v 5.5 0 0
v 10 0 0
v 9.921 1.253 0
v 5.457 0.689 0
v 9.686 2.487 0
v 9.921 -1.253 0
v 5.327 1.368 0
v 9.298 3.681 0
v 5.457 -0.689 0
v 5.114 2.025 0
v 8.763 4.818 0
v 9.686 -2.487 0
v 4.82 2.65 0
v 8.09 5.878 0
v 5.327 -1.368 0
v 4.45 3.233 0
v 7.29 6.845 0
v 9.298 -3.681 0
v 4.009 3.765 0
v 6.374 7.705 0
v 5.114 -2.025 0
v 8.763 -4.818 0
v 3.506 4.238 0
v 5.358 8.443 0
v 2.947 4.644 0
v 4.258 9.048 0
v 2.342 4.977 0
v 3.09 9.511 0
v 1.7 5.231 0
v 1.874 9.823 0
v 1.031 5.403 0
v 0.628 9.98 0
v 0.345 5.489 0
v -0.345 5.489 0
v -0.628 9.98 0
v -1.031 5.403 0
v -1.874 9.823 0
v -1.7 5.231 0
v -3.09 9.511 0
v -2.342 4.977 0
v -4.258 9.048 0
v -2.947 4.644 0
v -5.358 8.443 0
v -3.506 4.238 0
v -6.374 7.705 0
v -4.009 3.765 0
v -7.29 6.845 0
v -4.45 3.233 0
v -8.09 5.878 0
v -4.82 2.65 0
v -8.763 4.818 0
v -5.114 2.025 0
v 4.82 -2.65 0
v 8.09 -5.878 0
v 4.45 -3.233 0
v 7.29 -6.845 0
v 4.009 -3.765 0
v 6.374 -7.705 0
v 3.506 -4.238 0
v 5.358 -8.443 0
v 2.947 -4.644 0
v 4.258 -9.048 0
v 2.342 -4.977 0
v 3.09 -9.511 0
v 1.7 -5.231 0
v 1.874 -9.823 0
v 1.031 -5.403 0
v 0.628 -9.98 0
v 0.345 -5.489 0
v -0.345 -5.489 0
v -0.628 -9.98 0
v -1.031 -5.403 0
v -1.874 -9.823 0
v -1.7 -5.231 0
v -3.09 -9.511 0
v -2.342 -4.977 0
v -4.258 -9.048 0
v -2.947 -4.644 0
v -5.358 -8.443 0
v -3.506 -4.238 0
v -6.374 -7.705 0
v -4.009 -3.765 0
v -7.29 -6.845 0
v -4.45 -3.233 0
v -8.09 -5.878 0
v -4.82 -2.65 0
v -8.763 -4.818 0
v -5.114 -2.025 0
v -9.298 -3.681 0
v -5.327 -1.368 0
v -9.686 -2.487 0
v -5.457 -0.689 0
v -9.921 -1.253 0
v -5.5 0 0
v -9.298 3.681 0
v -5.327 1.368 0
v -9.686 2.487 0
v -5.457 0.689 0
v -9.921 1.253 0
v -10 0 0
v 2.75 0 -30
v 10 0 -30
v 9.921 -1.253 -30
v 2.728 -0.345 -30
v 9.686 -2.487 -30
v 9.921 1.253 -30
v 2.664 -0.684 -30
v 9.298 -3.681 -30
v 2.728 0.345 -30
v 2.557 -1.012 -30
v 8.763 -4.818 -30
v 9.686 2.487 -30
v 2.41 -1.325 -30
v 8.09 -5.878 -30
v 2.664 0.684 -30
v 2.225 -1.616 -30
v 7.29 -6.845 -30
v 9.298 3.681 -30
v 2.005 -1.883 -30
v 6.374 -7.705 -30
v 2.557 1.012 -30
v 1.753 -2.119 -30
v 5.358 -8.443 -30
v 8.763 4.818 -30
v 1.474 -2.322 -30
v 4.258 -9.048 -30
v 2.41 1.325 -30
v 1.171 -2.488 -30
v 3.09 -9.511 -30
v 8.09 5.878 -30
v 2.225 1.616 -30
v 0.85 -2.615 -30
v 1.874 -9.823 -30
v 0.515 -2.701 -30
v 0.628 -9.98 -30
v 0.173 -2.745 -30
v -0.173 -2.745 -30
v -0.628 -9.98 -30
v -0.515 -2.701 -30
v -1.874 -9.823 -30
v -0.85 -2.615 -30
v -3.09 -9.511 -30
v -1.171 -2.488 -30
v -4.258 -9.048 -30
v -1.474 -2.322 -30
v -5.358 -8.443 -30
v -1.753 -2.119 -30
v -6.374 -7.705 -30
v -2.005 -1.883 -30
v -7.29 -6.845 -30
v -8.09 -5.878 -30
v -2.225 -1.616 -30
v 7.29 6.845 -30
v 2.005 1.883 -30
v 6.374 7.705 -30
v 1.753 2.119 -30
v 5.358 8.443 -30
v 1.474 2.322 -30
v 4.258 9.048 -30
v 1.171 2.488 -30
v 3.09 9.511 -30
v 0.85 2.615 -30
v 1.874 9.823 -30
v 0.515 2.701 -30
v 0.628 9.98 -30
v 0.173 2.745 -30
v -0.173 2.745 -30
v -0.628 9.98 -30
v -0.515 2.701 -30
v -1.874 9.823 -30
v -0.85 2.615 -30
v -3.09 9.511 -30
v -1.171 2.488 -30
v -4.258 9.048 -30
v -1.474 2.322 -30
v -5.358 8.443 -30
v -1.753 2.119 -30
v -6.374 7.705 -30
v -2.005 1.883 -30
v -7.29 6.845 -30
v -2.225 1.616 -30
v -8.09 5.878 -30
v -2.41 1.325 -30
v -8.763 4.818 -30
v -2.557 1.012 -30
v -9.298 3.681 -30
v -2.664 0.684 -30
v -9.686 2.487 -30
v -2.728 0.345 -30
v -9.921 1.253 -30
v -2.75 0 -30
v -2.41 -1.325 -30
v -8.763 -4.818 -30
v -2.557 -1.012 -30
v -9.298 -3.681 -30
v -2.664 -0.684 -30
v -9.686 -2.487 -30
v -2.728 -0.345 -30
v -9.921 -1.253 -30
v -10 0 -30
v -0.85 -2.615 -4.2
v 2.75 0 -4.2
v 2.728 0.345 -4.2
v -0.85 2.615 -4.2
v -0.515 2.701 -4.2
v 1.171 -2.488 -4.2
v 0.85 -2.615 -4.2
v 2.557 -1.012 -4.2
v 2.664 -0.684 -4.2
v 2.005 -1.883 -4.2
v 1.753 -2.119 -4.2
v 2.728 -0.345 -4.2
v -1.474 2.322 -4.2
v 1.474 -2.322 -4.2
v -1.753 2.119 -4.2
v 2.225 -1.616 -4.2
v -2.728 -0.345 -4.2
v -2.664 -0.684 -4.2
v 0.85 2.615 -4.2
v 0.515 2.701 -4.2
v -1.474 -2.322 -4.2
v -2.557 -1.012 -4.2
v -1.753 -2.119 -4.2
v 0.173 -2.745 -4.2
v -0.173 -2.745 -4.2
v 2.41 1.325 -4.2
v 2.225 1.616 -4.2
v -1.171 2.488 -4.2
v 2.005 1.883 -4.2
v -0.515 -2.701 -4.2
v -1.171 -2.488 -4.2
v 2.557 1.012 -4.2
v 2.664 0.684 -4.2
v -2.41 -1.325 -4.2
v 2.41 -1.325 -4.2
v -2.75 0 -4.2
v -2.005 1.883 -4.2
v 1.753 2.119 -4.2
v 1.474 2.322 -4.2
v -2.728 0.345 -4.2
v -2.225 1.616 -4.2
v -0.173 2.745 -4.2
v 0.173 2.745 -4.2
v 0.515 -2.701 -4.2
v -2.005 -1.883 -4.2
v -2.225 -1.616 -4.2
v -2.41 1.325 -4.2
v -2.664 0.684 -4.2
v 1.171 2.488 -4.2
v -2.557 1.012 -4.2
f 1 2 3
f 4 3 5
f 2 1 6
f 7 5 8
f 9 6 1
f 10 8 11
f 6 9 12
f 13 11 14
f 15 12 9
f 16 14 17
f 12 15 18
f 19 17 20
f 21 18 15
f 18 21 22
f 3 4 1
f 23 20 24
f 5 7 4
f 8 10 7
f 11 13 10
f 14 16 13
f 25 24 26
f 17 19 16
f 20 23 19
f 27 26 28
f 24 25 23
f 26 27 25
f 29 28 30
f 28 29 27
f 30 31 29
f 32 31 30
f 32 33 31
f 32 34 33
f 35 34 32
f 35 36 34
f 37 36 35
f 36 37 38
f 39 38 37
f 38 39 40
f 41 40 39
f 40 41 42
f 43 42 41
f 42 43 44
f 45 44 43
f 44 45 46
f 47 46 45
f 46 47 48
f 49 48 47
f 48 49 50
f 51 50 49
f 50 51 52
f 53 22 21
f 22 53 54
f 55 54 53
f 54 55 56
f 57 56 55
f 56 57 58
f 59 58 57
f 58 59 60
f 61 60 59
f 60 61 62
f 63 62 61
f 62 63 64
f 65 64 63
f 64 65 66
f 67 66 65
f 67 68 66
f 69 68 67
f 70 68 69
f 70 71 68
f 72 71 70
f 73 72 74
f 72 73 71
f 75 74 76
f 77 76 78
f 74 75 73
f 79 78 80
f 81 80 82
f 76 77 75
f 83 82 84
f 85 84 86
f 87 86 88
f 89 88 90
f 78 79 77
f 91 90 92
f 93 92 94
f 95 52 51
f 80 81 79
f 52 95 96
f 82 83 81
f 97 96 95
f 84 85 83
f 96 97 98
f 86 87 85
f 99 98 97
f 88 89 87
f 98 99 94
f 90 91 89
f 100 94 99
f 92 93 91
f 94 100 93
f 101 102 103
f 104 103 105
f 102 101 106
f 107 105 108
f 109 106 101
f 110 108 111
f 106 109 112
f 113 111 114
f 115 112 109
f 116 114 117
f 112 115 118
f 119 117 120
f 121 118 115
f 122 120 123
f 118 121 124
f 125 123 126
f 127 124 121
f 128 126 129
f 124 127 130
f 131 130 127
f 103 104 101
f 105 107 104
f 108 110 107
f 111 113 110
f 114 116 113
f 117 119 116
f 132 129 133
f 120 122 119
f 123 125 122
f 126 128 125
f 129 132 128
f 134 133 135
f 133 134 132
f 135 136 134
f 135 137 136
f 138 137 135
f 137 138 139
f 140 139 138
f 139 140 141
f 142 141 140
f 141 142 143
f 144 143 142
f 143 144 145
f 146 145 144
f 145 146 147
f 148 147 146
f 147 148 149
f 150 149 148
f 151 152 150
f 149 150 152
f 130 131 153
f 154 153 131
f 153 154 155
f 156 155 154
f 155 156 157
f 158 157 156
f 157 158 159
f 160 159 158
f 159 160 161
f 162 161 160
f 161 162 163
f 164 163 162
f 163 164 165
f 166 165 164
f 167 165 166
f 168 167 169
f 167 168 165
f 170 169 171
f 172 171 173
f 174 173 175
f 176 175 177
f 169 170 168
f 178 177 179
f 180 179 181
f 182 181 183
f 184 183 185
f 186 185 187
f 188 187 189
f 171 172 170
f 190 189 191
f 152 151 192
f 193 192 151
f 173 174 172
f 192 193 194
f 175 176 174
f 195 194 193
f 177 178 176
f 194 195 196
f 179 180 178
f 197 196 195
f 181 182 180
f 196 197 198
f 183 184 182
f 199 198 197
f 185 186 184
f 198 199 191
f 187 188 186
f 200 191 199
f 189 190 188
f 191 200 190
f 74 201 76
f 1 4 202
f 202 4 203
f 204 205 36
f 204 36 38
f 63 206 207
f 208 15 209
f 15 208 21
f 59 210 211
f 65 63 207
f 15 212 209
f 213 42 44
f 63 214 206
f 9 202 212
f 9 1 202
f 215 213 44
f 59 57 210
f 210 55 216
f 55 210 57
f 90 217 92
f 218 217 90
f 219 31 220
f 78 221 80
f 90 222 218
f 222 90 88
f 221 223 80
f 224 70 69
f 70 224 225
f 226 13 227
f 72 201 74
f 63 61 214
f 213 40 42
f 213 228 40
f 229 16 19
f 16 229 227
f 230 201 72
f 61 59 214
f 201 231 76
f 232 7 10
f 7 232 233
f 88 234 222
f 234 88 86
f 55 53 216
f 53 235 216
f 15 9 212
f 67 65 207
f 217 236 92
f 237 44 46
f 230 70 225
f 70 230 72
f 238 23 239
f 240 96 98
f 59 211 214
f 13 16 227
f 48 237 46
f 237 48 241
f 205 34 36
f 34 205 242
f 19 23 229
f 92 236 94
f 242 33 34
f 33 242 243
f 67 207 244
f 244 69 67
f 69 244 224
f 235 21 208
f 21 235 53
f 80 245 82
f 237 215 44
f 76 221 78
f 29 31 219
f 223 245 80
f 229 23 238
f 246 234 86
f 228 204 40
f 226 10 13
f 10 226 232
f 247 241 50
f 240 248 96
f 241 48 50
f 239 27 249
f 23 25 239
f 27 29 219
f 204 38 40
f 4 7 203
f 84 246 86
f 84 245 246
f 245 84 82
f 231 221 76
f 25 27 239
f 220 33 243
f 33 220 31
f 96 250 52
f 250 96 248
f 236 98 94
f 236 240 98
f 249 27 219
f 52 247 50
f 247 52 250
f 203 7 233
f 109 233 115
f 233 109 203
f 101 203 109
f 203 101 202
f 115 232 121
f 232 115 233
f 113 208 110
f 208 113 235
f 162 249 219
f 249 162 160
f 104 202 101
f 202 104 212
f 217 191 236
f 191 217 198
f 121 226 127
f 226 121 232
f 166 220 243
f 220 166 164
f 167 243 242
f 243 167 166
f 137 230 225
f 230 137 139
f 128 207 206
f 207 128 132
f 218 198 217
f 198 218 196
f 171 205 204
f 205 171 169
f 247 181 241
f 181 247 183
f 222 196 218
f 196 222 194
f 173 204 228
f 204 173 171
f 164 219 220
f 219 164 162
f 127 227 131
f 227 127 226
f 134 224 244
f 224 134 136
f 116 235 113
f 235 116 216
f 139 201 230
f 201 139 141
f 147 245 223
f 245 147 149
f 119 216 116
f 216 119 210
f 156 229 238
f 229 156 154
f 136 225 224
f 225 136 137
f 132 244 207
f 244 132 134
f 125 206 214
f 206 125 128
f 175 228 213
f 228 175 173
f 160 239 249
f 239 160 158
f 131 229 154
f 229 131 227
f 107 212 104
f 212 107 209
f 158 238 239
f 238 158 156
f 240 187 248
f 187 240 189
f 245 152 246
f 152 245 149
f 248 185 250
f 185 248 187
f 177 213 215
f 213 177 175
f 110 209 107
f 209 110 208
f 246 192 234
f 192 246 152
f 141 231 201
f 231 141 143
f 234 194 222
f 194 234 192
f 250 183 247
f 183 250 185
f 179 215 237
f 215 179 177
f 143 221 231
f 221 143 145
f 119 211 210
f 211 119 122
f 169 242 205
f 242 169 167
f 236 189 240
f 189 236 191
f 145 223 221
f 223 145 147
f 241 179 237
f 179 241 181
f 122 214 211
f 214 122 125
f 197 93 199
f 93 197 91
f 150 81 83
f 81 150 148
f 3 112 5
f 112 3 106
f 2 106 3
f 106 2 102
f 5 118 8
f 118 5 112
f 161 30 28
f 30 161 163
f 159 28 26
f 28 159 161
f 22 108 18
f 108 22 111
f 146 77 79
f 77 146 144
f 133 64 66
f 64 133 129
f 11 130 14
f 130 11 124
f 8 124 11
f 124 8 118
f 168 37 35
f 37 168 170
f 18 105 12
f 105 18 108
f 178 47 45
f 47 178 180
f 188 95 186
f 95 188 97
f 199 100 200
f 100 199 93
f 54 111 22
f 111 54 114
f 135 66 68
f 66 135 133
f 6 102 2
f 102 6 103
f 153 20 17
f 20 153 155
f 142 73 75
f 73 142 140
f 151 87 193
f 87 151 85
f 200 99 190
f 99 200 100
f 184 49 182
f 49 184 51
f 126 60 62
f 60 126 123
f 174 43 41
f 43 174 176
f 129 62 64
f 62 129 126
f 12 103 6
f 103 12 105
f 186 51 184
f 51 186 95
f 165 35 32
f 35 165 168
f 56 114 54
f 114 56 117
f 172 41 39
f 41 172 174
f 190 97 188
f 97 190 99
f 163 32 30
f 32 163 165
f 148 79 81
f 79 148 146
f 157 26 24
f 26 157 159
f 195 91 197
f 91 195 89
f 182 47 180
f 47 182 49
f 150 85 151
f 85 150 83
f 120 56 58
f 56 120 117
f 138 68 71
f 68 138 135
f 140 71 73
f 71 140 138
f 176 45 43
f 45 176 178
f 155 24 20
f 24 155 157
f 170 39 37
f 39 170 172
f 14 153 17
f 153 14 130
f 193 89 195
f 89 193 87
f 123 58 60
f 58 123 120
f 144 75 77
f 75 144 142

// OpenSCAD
$fn = 50;


difference() {
	union() {
		translate(v = [0, 0, -30.0000000000]) {
			cylinder(h = 30, r = 10.0000000000);
		}
		cylinder(h = 0, r = 13.0000000000);
	}
	union() {
		translate(v = [0, 0, 0]) {
			rotate(a = [0, 0, 0]) {
				difference() {
					union() {
						#translate(v = [0, 0, -30.0000000000]) {
							cylinder(h = 30, r = 2.2500000000);
						}
						#translate(v = [0, 0, -4.2000000000]) {
							cylinder(h = 4.2000000000, r1 = 2.7500000000, r2 = 5.5000000000);
						}
						#translate(v = [0, 0, -30.0000000000]) {
							cylinder(h = 30, r = 2.7500000000);
						}
						#translate(v = [0, 0, -30.0000000000]) {
							cylinder(h = 30, r = 2.2500000000);
						}
					}
					union();
				}
			}
		}
	}
}
